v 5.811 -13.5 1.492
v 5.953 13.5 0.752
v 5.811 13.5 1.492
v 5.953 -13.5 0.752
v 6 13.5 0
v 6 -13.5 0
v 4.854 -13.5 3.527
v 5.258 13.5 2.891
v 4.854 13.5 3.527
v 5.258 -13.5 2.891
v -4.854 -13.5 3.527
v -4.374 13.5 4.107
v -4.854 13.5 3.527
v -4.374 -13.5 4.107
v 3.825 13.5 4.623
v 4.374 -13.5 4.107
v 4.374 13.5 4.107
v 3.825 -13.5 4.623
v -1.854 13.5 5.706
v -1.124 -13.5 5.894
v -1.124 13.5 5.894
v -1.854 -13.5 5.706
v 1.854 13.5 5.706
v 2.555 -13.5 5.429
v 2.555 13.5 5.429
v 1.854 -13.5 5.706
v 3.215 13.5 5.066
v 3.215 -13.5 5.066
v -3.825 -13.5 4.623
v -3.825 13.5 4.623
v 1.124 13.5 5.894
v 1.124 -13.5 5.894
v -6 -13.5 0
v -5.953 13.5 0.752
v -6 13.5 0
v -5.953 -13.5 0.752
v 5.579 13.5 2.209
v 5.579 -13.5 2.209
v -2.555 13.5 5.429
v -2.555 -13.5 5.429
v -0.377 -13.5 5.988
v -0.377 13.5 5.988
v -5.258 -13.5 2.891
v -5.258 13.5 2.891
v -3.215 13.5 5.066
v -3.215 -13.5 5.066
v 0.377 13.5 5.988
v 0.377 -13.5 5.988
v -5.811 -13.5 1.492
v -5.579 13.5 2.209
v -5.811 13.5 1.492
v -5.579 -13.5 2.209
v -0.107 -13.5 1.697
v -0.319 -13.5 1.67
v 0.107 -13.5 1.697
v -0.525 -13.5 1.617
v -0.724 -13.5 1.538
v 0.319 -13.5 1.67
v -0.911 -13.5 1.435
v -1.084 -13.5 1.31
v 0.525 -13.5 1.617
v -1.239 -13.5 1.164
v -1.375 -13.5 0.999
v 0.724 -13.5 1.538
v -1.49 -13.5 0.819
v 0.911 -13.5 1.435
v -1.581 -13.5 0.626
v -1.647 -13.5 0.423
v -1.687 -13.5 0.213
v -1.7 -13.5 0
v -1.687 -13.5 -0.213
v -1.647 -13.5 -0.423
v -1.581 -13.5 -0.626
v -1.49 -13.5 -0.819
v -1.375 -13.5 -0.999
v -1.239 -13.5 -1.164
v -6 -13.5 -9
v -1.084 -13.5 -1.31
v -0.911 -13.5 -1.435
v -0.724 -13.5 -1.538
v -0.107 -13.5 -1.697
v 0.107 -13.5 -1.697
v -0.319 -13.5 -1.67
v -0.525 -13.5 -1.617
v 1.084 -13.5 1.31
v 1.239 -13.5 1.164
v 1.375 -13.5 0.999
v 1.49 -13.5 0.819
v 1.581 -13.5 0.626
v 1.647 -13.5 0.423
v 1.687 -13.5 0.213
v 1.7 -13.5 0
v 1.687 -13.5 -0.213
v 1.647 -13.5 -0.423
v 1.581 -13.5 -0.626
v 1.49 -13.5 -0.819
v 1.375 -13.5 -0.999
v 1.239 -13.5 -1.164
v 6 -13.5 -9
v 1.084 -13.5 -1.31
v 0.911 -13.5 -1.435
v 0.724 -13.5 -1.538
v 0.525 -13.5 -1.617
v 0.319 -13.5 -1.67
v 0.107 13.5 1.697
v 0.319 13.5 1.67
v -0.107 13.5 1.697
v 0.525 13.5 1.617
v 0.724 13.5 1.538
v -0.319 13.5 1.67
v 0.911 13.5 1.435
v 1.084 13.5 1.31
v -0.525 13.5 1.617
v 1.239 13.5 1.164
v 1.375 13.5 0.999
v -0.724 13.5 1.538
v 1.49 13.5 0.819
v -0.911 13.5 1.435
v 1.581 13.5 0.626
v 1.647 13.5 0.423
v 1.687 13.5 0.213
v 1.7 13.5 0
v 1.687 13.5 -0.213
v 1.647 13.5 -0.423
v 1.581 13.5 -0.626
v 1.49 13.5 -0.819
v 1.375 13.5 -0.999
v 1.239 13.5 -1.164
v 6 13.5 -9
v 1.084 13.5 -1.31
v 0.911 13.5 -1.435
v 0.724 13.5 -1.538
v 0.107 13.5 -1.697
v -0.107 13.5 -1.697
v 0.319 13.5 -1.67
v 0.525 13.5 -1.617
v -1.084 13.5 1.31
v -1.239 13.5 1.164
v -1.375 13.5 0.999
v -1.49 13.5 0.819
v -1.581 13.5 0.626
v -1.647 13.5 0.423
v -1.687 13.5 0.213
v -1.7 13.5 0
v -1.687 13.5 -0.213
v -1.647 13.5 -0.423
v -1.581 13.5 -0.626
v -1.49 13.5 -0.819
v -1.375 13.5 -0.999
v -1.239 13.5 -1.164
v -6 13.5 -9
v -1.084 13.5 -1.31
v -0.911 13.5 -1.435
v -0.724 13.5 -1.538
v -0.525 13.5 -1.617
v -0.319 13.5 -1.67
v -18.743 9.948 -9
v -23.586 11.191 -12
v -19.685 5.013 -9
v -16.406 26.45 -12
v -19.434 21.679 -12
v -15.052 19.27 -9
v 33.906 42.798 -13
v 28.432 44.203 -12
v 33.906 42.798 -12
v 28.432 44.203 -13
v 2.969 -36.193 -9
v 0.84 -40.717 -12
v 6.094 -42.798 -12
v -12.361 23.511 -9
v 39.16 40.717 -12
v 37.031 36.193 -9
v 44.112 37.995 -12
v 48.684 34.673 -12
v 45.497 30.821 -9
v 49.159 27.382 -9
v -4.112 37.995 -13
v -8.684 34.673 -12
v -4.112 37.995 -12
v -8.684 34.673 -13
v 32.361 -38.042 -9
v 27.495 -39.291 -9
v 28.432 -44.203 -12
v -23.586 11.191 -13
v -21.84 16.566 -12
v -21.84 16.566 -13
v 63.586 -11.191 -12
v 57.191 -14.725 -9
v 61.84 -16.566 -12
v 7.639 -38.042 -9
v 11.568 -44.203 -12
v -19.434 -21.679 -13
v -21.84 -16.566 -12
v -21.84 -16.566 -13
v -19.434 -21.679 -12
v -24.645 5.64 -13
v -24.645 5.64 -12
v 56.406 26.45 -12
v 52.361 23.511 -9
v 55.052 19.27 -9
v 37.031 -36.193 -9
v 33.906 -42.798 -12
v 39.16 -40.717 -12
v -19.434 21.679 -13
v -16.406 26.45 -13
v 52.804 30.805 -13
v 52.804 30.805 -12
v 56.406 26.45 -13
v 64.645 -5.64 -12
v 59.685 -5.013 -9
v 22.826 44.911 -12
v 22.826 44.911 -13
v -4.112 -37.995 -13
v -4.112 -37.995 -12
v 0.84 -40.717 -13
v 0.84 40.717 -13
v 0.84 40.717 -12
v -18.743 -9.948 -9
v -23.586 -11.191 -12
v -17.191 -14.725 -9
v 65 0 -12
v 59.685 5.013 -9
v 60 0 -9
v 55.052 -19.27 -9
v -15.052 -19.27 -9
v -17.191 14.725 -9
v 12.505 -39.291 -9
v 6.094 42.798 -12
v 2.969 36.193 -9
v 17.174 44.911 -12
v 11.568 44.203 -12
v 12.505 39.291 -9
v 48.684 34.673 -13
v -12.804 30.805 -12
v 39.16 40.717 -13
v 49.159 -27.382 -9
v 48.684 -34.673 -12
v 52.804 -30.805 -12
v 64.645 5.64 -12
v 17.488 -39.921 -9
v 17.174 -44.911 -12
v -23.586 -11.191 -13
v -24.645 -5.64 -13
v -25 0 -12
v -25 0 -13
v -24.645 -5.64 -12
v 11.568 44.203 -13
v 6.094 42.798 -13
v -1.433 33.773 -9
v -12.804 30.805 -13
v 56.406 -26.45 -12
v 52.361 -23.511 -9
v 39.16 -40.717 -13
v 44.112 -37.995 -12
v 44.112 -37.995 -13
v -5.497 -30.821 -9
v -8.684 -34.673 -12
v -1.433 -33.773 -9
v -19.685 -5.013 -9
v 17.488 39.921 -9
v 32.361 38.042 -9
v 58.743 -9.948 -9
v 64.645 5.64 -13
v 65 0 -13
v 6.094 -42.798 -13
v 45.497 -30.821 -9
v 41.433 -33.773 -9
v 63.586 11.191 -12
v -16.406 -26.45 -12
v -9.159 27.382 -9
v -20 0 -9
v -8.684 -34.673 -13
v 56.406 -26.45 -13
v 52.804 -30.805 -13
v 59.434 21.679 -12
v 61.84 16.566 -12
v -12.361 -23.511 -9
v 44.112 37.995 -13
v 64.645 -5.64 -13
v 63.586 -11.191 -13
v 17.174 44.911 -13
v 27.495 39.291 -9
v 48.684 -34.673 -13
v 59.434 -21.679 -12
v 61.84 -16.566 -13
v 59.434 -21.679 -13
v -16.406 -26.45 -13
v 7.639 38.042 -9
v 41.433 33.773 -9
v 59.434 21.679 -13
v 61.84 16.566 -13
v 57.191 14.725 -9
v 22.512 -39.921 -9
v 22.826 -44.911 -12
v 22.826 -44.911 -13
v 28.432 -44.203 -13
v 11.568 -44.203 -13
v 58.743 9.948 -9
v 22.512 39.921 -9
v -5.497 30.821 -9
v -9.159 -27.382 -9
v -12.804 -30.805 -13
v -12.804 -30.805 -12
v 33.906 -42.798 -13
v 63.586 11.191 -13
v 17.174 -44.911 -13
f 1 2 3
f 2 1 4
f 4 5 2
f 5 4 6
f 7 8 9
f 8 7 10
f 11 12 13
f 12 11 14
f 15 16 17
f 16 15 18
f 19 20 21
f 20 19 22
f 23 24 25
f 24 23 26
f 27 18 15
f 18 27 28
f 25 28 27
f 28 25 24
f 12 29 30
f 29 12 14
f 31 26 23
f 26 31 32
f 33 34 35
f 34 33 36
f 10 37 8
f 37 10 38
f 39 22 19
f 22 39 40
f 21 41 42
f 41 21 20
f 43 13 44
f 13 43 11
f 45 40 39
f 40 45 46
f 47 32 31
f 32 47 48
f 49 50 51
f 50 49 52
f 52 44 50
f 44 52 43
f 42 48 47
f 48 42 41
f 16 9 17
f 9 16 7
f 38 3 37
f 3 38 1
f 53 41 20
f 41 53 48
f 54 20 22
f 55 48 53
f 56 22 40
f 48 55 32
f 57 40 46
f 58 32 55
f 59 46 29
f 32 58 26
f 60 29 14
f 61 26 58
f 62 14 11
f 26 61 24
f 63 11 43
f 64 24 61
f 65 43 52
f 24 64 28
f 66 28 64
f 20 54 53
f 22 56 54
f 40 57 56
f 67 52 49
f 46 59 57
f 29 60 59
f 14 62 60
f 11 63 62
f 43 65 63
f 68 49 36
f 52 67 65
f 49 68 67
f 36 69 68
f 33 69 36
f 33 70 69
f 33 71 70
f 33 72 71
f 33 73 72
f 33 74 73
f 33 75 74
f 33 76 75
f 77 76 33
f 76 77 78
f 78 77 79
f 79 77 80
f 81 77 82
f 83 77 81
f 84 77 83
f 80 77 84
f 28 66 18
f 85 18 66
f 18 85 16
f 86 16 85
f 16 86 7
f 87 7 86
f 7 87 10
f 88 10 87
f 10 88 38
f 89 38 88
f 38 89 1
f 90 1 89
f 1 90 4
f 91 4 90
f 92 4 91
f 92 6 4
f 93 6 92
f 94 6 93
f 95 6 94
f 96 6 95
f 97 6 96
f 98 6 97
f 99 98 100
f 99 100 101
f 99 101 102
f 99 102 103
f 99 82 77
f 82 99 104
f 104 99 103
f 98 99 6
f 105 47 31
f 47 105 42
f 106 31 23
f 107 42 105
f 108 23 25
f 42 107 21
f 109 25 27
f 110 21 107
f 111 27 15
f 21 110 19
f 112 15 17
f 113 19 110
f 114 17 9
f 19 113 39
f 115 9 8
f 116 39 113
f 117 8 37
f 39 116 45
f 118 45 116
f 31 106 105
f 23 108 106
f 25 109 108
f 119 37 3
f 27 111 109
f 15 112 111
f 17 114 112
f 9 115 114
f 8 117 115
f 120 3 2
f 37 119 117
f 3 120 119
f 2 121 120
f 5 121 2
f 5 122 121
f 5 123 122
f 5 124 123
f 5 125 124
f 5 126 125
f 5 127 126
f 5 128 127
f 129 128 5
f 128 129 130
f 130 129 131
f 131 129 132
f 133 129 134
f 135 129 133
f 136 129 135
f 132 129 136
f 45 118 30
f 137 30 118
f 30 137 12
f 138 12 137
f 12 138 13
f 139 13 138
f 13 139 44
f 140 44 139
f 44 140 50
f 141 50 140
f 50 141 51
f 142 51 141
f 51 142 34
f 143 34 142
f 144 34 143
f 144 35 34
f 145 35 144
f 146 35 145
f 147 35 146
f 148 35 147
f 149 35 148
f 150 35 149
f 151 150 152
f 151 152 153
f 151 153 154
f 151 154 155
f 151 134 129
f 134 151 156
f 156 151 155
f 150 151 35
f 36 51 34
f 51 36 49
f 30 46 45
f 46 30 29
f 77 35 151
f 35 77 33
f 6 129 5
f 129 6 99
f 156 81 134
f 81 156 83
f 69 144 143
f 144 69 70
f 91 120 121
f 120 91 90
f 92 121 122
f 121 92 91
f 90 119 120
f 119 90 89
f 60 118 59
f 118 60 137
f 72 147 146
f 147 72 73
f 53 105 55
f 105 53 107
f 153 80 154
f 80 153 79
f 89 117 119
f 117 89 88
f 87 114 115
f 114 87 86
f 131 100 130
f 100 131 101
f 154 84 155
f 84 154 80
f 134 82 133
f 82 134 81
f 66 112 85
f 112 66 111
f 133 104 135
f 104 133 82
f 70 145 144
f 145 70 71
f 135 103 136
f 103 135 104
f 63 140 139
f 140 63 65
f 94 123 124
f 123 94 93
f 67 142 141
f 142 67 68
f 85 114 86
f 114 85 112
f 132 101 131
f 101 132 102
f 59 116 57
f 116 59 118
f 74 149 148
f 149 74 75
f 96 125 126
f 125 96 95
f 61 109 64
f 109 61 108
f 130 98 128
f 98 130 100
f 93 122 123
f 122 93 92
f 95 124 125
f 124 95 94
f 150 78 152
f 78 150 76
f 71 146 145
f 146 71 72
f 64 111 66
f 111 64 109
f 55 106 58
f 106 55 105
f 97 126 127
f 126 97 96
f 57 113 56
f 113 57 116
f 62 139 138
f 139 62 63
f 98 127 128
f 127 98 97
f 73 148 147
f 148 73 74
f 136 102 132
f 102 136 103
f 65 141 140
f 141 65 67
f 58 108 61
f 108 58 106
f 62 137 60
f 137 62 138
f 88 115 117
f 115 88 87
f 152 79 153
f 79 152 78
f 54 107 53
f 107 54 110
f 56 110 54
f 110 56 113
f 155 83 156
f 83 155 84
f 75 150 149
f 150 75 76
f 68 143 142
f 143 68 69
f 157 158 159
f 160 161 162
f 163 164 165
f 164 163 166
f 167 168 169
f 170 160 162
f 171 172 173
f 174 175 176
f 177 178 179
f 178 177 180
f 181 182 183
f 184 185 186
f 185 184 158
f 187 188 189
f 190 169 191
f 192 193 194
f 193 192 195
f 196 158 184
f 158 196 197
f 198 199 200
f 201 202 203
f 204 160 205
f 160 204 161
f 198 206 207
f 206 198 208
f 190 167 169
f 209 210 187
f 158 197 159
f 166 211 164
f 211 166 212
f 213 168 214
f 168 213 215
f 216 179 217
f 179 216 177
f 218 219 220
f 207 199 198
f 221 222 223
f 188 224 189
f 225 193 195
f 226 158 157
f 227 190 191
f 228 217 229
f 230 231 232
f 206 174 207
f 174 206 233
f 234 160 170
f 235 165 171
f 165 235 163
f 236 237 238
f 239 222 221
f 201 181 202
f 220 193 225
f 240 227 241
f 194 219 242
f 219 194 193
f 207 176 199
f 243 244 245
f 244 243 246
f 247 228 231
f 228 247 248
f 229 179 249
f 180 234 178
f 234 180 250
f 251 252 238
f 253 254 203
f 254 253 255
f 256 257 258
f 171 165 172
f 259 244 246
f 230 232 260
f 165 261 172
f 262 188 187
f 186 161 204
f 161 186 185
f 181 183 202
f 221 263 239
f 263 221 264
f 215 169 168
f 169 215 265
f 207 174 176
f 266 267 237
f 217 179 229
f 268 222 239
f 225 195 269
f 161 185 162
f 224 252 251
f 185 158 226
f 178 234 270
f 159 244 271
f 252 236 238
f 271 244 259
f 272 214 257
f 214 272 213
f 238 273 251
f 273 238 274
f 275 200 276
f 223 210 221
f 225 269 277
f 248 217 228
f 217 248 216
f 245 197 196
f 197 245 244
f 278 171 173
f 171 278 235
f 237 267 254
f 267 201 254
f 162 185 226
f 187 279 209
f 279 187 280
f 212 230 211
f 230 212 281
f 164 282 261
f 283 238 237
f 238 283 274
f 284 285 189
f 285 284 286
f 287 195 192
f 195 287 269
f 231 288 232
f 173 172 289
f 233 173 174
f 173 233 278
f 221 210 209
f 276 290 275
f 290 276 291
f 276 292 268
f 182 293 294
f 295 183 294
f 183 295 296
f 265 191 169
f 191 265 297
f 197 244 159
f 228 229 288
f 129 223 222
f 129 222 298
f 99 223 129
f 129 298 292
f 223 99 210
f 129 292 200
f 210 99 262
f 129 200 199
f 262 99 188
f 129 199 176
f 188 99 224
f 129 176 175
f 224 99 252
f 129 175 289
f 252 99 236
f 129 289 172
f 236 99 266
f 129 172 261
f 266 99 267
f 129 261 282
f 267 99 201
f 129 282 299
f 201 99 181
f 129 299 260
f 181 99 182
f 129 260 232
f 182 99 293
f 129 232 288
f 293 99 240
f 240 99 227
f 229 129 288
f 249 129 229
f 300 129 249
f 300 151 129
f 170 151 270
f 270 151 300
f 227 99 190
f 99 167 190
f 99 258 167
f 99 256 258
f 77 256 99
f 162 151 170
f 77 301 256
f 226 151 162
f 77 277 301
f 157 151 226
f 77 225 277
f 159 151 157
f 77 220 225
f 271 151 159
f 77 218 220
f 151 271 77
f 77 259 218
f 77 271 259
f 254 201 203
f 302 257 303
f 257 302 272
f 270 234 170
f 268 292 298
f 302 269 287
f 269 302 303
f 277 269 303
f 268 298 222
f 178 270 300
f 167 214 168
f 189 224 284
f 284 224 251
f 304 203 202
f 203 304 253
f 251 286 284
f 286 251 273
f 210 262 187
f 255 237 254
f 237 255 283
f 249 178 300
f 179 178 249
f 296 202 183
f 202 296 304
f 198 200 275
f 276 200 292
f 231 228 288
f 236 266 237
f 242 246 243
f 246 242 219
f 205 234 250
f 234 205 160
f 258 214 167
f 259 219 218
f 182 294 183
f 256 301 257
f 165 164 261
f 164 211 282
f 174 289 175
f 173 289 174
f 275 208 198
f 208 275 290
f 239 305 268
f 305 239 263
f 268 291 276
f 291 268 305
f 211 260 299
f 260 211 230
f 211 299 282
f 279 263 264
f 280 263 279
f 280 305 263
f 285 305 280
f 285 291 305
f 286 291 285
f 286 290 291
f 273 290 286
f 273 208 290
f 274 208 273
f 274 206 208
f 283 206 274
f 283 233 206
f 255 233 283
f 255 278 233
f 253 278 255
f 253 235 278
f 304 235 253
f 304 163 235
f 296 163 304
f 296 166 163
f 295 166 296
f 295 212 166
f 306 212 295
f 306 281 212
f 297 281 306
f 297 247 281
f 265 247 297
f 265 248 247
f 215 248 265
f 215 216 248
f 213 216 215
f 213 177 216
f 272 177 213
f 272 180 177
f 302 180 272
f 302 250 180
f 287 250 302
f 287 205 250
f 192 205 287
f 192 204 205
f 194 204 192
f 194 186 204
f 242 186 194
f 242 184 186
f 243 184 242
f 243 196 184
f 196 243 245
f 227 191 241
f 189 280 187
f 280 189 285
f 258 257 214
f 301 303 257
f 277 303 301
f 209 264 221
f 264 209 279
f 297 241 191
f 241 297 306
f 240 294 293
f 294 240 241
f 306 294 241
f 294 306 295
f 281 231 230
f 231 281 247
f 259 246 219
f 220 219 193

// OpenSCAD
// file: pin_headers.scad
// pin_headers.scad
//
// Model of through-hole pin headers.
//
// Units are metric
//
// "height" is the total length of the pin. Default is 12mm.
// "upper" is the length of the pin above the stopper. Default is 7mm.
// "rows" is the number of rows. Default is 3.
// "cols" is the number of columns. Default is 2.
//
// Examples:
// pin_header( 12, 7, 2, 5);
// pin_header( rows=5 cols=1 );
// By Paul McGovern

module off_pin_header(height=12, upper=7, rows=3, cols=2) {
cl = 2.54;
translate( [ -(rows * cl/2 ), -(cols * cl/2 ), 0 ] )
pin_header(height, upper, rows,cols);
}

module pin_header( height=12, upper=7, rows=3, cols=2 ) {

        cl = 2.54;

        translate( [ -(rows * cl/2 ) + cl /2, -(cols * cl/2 ) + cl /2, 0 ] ) {

                for( col = [0: cols -1 ] ) {
                        for( row = [0 : rows -1 ] ) {

                                translate( [ cl * row , cl * col, 0] ) {
        
                                        color( "gray" )
                                                translate( [0,0, cl / 2]) {
                                                        intersection() {
                                                                cube( [ cl, cl, cl ], center=true );
                                                                rotate( [0, 0, 45] ) cube( [ 2.8, 2.8, cl ], center=true );
                                                }
                                }

                                color( "gold" ) {
                                        translate( [0,0, (upper - ( height/2 )) + cl ] ) {
                                                union() {
                                                        cube( [0.64,0.64,height], center=true );
                                                        translate( [0,0, height/2 ] ) scale( 0.64 ) _pin_point();
                                                        translate( [0,0, -height/2 ] ) scale( 0.64 )        rotate([180,0,0] )_pin_point();
                                                }
                                        }
                                }
                        }
                }
        }
}
}

module _pin_point() {
        translate( [-0.5,-0.5, 0])
                polyhedron(
                        points=[[0,0,0],[0,1,0],[1,1,0],[1,0,0],[0.5,0.5,0.5]],
                        triangles=[[0,1,2],[0,2,3],[0,1,4],[1,2,4],[2,3,4],[3,0,4]]);
}

off_pin_header();
%pin_header();
// file: tools.scad
module roundedRect(size, radius) {
	x = size[0];
	y = size[1];
	z = size[2];

	linear_extrude(height=z)
		hull() {
		translate([radius, radius, 0])
		circle(r=radius, $fn=10);

		translate([x - radius, radius, 0])
		circle(r=radius, $fn=10);

		translate([x - radius, y - radius, 0])
		circle(r=radius, $fn=10);

		translate([radius, y - radius, 0])
		circle(r=radius, $fn=10);
	}
}
// file: hardware.scad
// License: LGPL 2.1

rodsize = 6;        //threaded/smooth rod diameter in mm
xaxis = 182.5;        //width of base in mm
yaxis = 266.5;        //length of base in mm


screwsize = 3;        //bearing bore/screw diameter in mm
bearingsize = 10;        //outer diameter of bearings in mm
bearingwidth = 4;        //width of bearings in mm


rodpitch = rodsize / 6;
rodnutsize = 0.8 * rodsize;
rodnutdiameter = 1.9 * rodsize;
rodwashersize = 0.2 * rodsize;
rodwasherdiameter = 2 * rodsize;
screwpitch = screwsize / 6;
nutsize = 0.8 * screwsize;
nutdiameter = 1.9 * screwsize;
washersize = 0.2 * screwsize;
washerdiameter = 2 * screwsize;
partthick = 2 * rodsize;
vertexrodspace = 2 * rodsize;


c = [0.3, 0.3, 0.3];
rodendoffset = rodnutsize + rodwashersize * 2 + partthick / 2;
vertexoffset = vertexrodspace + rodendoffset;


renderrodthreads = false;
renderscrewthreads = false;
fn = 36;



module rod(length, threaded) if (threaded && renderrodthreads) {
        linear_extrude(height = length, center = true, convexity = 10, twist = -360 * length / rodpitch, $fn = fn)
                translate([rodsize * 0.1 / 2, 0, 0])
                        circle(r = rodsize * 0.9 / 2, $fn = fn);
} else cylinder(h = length, r = rodsize / 2, center = true, $fn = fn);


module screw(length, nutpos, washer, bearingpos = -1) union(){
        translate([0, 0, -length / 2]) if (renderscrewthreads) {
                linear_extrude(height = length, center = true, convexity = 10, twist = -360 * length / screwpitch, $fn = fn)
                        translate([screwsize * 0.1 / 2, 0, 0])
                                circle(r = screwsize * 0.9 / 2, $fn = fn);
        } else cylinder(h = length, r = screwsize / 2, center = true, $fn = fn);
        render() difference() {
                translate([0, 0, screwsize / 2]) cylinder(h = screwsize, r = screwsize, center = true, $fn = fn);
                translate([0, 0, screwsize]) cylinder(h = screwsize, r = screwsize / 2, center = true, $fn = 6);
        }
        if (washer > 0 && nutpos > 0) {
                washer(nutpos);
                nut(nutpos + washersize);
        } else if (nutpos > 0) nut(nutpos);
        if (bearingpos >= 0) bearing(bearingpos);
}


module bearing(position) render() translate([0, 0, -position - bearingwidth / 2]) union() {
        difference() {
                cylinder(h = bearingwidth, r = bearingsize / 2, center = true, $fn = fn);
                cylinder(h = bearingwidth * 2, r = bearingsize / 2 - 1, center = true, $fn = fn);
        }
        difference() {
                cylinder(h = bearingwidth - 0.5, r = bearingsize / 2 - 0.5, center = true, $fn = fn);
                cylinder(h = bearingwidth * 2, r = screwsize / 2 + 0.5, center = true, $fn = fn);
        }
        difference() {
                cylinder(h = bearingwidth, r = screwsize / 2 + 1, center = true, $fn = fn);
                cylinder(h = bearingwidth + 0.1, r = screwsize / 2, center = true, $fn = fn);
        }
}


module nut(position, washer) render() translate([0, 0, -position - nutsize / 2]) {
        intersection() {
                scale([1, 1, 0.5]) sphere(r = 1.05 * screwsize, center = true);
                difference() {
                        cylinder (h = nutsize, r = nutdiameter / 2, center = true, $fn = 6);
                        cylinder(r = screwsize / 2, h = nutsize + 0.1, center = true, $fn = fn);
                }
        }
        if (washer > 0) washer(0);
}


module washer(position) render() translate ([0, 0, -position - washersize / 2]) difference() {
        cylinder(r = washerdiameter / 2, h = washersize, center = true, $fn = fn);
        cylinder(r = screwsize / 2, h = washersize + 0.1, center = true, $fn = fn);
}

module rodnut(position, washer) render() translate([0, 0, position]) {
        intersection() {
                scale([1, 1, 0.5]) sphere(r = 1.05 * rodsize, center = true);
                difference() {
                        cylinder (h = rodnutsize, r = rodnutdiameter / 2, center = true, $fn = 6);
                        rod(rodnutsize + 0.1);
                }
        }
        if (washer == 1 || washer == 4) rodwasher(((position > 0) ? -1 : 1) * (rodnutsize + rodwashersize) / 2);
        if (washer == 2 || washer == 4) rodwasher(((position > 0) ? 1 : -1) * (rodnutsize + rodwashersize) / 2);
}


module rodwasher(position) render() translate ([0, 0, position]) difference() {
        cylinder(r = rodwasherdiameter / 2, h = rodwashersize, center = true, $fn = fn);
        rod(rodwashersize + 0.1);
}


rod(20);
translate([rodsize * 2.5, 0, 0]) rod(20, true);
translate([rodsize * 5, 0, 0]) screw(10, true);
translate([rodsize * 7.5, 0, 0]) bearing();
translate([rodsize * 10, 0, 0]) rodnut();
translate([rodsize * 12.5, 0, 0]) rodwasher();
translate([rodsize * 15, 0, 0]) nut();
translate([rodsize * 17.5, 0, 0]) washer();
// file: camera+support.scad
boxThickness =2;

module drawCamera(){
	translate([0,-1,-1])cube([27, 26,2]);
	color("black") translate([8.5,5.5,1]) cube([8,8,6]);
	translate([21+3+0.5,-2, -1-6]) rotate([0, 0, 90]) color("brown") cube([9, 22, 6]);
}

module drawOneCameraSupport(){
	translate([0,-3*boxThickness,-2*boxThickness]) cube([8, 6*boxThickness, 4*boxThickness]);
	}

module drawTopCameraSupport(){
	difference(){
		color("red") union(){
			translate([25-2*boxThickness, 0,0]) drawOneCameraSupport();
			translate([25-2*boxThickness, 24,0]) drawOneCameraSupport();
		}
		drawCamera();
	}
}

module drawBottomCameraSupport(){
	difference(){
		color("red") union(){
			translate([-boxThickness,0,0]) drawOneCameraSupport();
			translate([-boxThickness,24,0]) drawOneCameraSupport();
		}
		drawCamera();
	}
}

module drawCameraSupport(){
	difference(){
		color("red") union(){
			//translate([-boxThickness,0,0]) drawOneCameraSupport();
			translate([25-2*boxThickness, 0,0]) drawOneCameraSupport();
			//translate([-boxThickness,24,0]) drawOneCameraSupport();
			translate([25-2*boxThickness, 24,0]) drawOneCameraSupport();
		}
		drawCamera();
	}
}

drawTopCameraSupport();
drawBottomCameraSupport();
drawCamera();
// file: raspberry_pi.scad
//everything in mm

use <pin_headers.scad>;

width = 56.5;
length = 86;
height = 1.5;

color([0,1,0]) import("pi.STL");


module ethernet ()
{
//ethernet port
color("silver")
translate([length-20,1.5,height]) cube([21.2,16,13.3]);
}

module usb ()
{
//usb port
color("silver")
translate([length-9.5,25-1,height]) cube([17.3+30,15,16]);
}

module composite ()
{
//composite port
translate([length-43.6-1,width-12,height+1]){
        color("yellow")
        cube([10,10,13]);
        translate([5,24,8])
        rotate([90,0,0])
        color("silver")
        cylinder(h = 15, r = 5);
}
}

module audio ()
{
//audio jack
translate([length-26,width-11.5,height]){
        color("yellow")
        cube([12,11.5,13]);
        translate([6,11.5,8])
        rotate([-90,0,0])
        color("silver")
        cylinder(h = 10.5, r = 4.15);
}
}


module gpio ()
{
//headers
//rotate([0,0,180])
//translate([-1,-width+6,height])
//off_pin_header(rows = 13, cols = 2);
translate([0,56-17-5, 0]) cube([40, 10, 30]);
}

module hdmi ()
{
  color ("yellow") translate ([37.1,-1,height]) cube([15.1,11.7,8-height]);
}

module power ()
{
  translate ([-10.8,0.8,height-3]) cube ([15.6, 12,8.4-height]);
}

module sd ()
{
  color ([0,0,0]) translate ([0.9, 15.2,-5.2+height ]) cube ([16.8, 28.5, 5.2-height]);
  color ([.2,.2,.7]) translate ([-17.3,17.7,-2.9-0.5]) cube ([32, 24+1, 3] );
}

module mhole ()
{
  cylinder (r=3/2, h=height+.2, $fs=0.1);
}


module raspberrypi(){
//translate([-length/2,width/2 + 10,0])
{
difference () {
   color([0.2,0.5,0])
   linear_extrude(height = height)
   translate([0,-0.5,0])square([length,width]); //pcb
   translate ([25.5, 18,-0.1]) mhole ();
   translate ([length-5, width-12.5, -0.1]) mhole ();
}

ethernet ();
usb ();
composite ();
audio ();
gpio ();
hdmi ();
power ();
sd ();
}
}

raspberrypi();
// file: camette_box.scad
use <raspberry_pi.scad>
use <camera+support.scad>
use <hardware.scad>
use <tools.scad>
use <openhardwarefinal.scad>

raspSize = [105, 80,14.5];

boxThickness = 1;
boxRadius = 2;

module drawRaspBox(boxSize, rbox, rbias){
	cylinderCenterX = (boxSize[0]-rbox*8-boxRadius)/2;
union(){
difference(){
	union(){
		// design the round 1
		translate([rbox+cylinderCenterX, -rbox/2-rbias, 0])
		difference(){
			cylinder(h=boxSize[2], r=rbox+rbias, $fn=50);
			translate([-2*rbox,-3*rbox,-1])cube([rbox*4, 5*rbox/2+rbox+rbias, boxSize[2]+2]);
		}
		// design the round 2
		translate([((rbox)*3+cylinderCenterX), -rbox/2-rbias, 0])
		difference(){
			cylinder(h=boxSize[2], r=rbox+rbias, $fn=50);
			translate([-2*rbox,-3*rbox,-1])cube([rbox*4, 5*rbox/2+rbox+rbias, boxSize[2]+2]);
		}
		// design the round 3
		translate([(rbox)*5+cylinderCenterX, -rbox/2-rbias, 0])
		difference(){
			cylinder(h=boxSize[2], r=rbox+rbias, $fn=50);
			translate([-2*rbox,-3*rbox,-1])cube([rbox*4, 5*rbox/2+rbox+rbias, boxSize[2]+2]);
		}
		// design the round 4
		translate([(rbox)*7+cylinderCenterX, -rbox/2-rbias, 0])
		difference(){
			cylinder(h=boxSize[2], r=rbox+rbias, $fn=50);
			translate([-2*rbox,-3*rbox,-1])cube([rbox*4, 5*rbox/2+rbox+rbias, boxSize[2]+2]);
		}

		//design the box
		difference(){
		roundedRect(boxSize, boxRadius);
			translate([boxThickness,boxThickness,-boxThickness]) 
			roundedRect([boxSize[0]-boxThickness*2,boxSize[1]-boxThickness*2,boxSize[2]-boxThickness+1], boxRadius);
		}


	}

	translate([rbox+cylinderCenterX,-rbox/2-rbias, -boxThickness]) cylinder(h=boxSize[2]+2, r=(rbox-boxThickness+rbias), $fn=50);
	translate([3*(rbox)+cylinderCenterX,-rbox/2-rbias, -boxThickness]) cylinder(h=boxSize[2]+2, r=(rbox-boxThickness+rbias), $fn=50);
	translate([5*(rbox)+cylinderCenterX,-rbox/2-rbias, -boxThickness]) cylinder(h=boxSize[2]+2, r=(rbox-boxThickness+rbias), $fn=50);
	translate([7*(rbox)+cylinderCenterX,-rbox/2-rbias, -boxThickness]) cylinder(h=boxSize[2]+2, r=(rbox-boxThickness+rbias), $fn=50);

}

}

}

module drawBottomBox(){
	rfinger = (raspSize[0]/4-boxThickness)/2;
	tmpBoxSize = [raspSize[0]+rfinger/2+boxThickness, raspSize[1]+boxThickness, raspSize[2]+boxThickness]; 

	drawRaspBox(tmpBoxSize, rfinger, 0);
	rinsidefinger = ((raspSize[0])/4-boxThickness)/2;
	translate([boxThickness, boxThickness, -2*boxThickness]) drawRaspBox([tmpBoxSize[0]-2*boxThickness,tmpBoxSize[1]-2*boxThickness, tmpBoxSize[2]+2*boxThickness], rinsidefinger, boxThickness/2);
}

module drawTopBox(){
// Top box
	rfinger = (raspSize[0]/4-boxThickness)/2;
	tmpBoxSize = [raspSize[0]+rfinger/2+boxThickness, raspSize[1]+boxThickness, raspSize[2]+boxThickness];
	// design fisheye support
	translate([-1.5,0,0]) difference(){
		color("black")translate([raspSize[0]+6*boxThickness+2.5, raspSize[1]-14.5-1.5-8*boxThickness/2-1, raspSize[2]-12.5-1.5-1])rotate([0,90,0]) cylinder(h=4, r=7.5+3*boxThickness, $fn=50);
		translate([raspSize[0]+6*boxThickness+2.5-0.1, raspSize[1]-14.5-1.5-8*boxThickness/2-1, raspSize[2]-12.5-1.5-1])rotate([0,90,0]) cylinder(h=4.5, r=7.5, $fn=50);
	}
	difference(){
		color("red")rotate([0,180,0]) mirror() drawRaspBox(tmpBoxSize, rfinger, 0);		
	}
}

// Draw box with different cam/rapsberry support
module drawEntireTopBox(){
	rSmooth=15;
	smoothThickness = 3;
	angle=15;

	difference(){
	union(){
		drawTopBox();		
			// camette support
			translate([7*raspSize[0]/8+2*boxThickness, rSmooth+3*rfinger/4, -raspSize[2]-1])
			cylinder(h=2*boxThickness+2, r=rSmooth+3);
			translate([35+22, 26+28.5, -raspSize[2]-1]) cylinder(r=25, h=3);
			//camera
			translate([raspSize[0]-2*boxThickness, raspSize[1]-24-6*boxThickness, raspSize[2]-boxThickness]) rotate([-90,90,-90]){
				//drawCamera();
				drawTopCameraSupport();
			}
	}
		union(){
			// Raspberry
			translate([3*boxThickness, 56+rfinger/2+boxThickness+0.5,raspSize[2]-boxThickness-3]) rotate([180,0,0]) raspberrypi();
			// Logo
			translate([35, 26, -raspSize[2]-3.5]) scale([0.19, 0.19]) dxf_linear_extrude(file="logo_camera.dxf", height=3, convexity=1);
			// camera eye
			translate([raspSize[0]+4*boxThickness, raspSize[1]-14.5-1.5-8*boxThickness/2-1, raspSize[2]-12.5-1.5-1]) rotate([0,90,0]) cylinder(h=4*boxThickness, r=4, $fn=50);
			// camette support smooth gear
			//color("orange")translate([3*raspSize[0]/4+2*boxThickness, rSmooth+rfinger/2, -raspSize[2]-boxThickness-2]) smoothGear(angle, rSmooth, 3+1);
			color("orange") translate([7*raspSize[0]/8+2*boxThickness, rSmooth+3*rfinger/4, -raspSize[2]-2]) scale([0.18,0.18,1.0]) openHardware_intrude(4);

		}
	}
}

module drawEntireBottomBox(){
	rSmooth=15;
	smoothThickness = 3;
	angle=15;

	difference(){
		union(){
			color("blue") drawBottomBox(); 
			translate([80+3*boxThickness, 50+rfinger/2+boxThickness,raspSize[2]-9]) cube([10,10,10]);
			// camette support
// camette support
			translate([7*raspSize[0]/8+2*boxThickness, rSmooth+3*rfinger/4, raspSize[2]-boxThickness-2])
			cylinder(h=2*boxThickness+2, r=rSmooth+3);
			
			// sensor support
			translate([raspSize[0]-2*boxThickness, raspSize[1]-24-6*boxThickness, raspSize[2]-boxThickness]) rotate([-90,90,-90]){
				//drawCamera();
				drawBottomCameraSupport();
			}
		}

		union(){
			// Raspberry
			translate([3*boxThickness, 56+rfinger/2+boxThickness+0.5,raspSize[2]-boxThickness-3]) rotate([180,0,0]) raspberrypi();
translate([35,15, -raspSize[2]-3.5]) scale([0.2, 0.2]) dxf_linear_extrude(file="logo_camera.dxf", height=3, convexity=1);
			// camera eye
			translate([raspSize[0]+4*boxThickness, raspSize[1]-14.5-1.5-8*boxThickness/2-1, raspSize[2]-12.5-1.5-1]) rotate([0,90,0]) cylinder(h=4*boxThickness, r=4, $fn=50);
			// camette support smooth gear
			color("orange") translate([7*raspSize[0]/8+2*boxThickness, rSmooth+3*rfinger/4, raspSize[2]-2]) scale([0.18,0.18,1.0]) openHardware_intrude(4);
			
		}
	}
}

rfinger = (raspSize[0]/4-boxThickness)/2;


color("red") drawEntireTopBox();
color("blue") drawEntireBottomBox();
rfinger = (raspSize[0]/4-boxThickness)/2;
translate([3*boxThickness, 56+rfinger/2+boxThickness+0.5,raspSize[2]-boxThickness-3]) rotate([180,0,0]) raspberrypi();
// file: MOLETTE.scad
r_molette=8; //10 pour les petites et 12 pour les grandes
r_trou=1.5;
trou_m3=2;
ecrou_m3=3.2;
ep=5;
nb_trou=12;

module trou(){
	translate([r_molette,0,-5]){cylinder(h=ep+10, r=r_trou, $fn=50);}

}

module molette(){
	difference(){
		cylinder(h=ep, r=r_molette, $fn=100);

		translate([0,0,-5]){cylinder(h=ep+10, r=trou_m3, $fn=50);}
		translate([0,0,ep/2]){cylinder(h=ep, r=ecrou_m3, $fn=6);}

		for(i=[0:1:nb_trou]){
		rotate([0,0,i*(360/nb_trou)])trou();
		}

	}

}

molette();
// file: openhardwarefinal.scad
//-----------------------------------------------------------------------------
// Nelson Neves: nelson.s.neves@gmail.com
//-----------------------------------------------------------------------------
// disable $fn and $fa, do not change these
$fn=0;
$fa = 0.01;
// use $fs to control the number of facets globally // fine ~ 0.1 coarse ~ 1.0
$fs = 0.3;
//-----------------------------------------------------------------------------

module openHardware_extrude(oHeight){
	scale(v = [1.0, 1.0, 1.0]) {
		translate([-78.9,-71.2+5])
     		linear_extrude(height = oHeight) import("openhardwarefinal0_petit.dxf");

	}
}
//-----------------------------------------------------------------------------
module openHardware_intrude(oHeight){
	scale(v = [1.0, 1.0, 1.0]) {
		translate([-80, -76.6+11]) 
    		  linear_extrude(height = oHeight) import("openhardwarefinal0_grossi.dxf");
	}
}

difference(){
	cylinder(r=15, h=3);	
	translate([0,0,1])scale([0.15,0.15,1.0]) openHardware_intrude(3);
}

translate([30,0,0])
	scale([0.15,0.15,1.0])openHardware_extrude(3);
// main file
use <openhardwarefinal.scad>
use <MOLETTE.scad>
use <camette_box.scad>

raspSize = [105, 80,14.5+2];
supportHeight = 3;

module pied_support(angle){
	difference(){
		union(){
			hull(){
				cylinder(r=16, h=supportHeight, $fn=50);
				translate([0, 90, 0])
					cylinder(r=6, h=supportHeight, $fn=50);
			}
			translate([0, 90, supportHeight]) cylinder(r=6, h=supportHeight, $fn=50);
		}
		union(){
			translate([0,90*0.6/2,-1])scale([0.6,0.6,1.0])hull(){
				cylinder(r=16, h=supportHeight+2, $fn=50);
				translate([0, 90, 0])
					cylinder(r=6, h=supportHeight+2, $fn=50);
			}
			translate([0, 90, -1]) cylinder(r=1.7, h=2*supportHeight+2, $fn=50);
			rotate([0,0,angle]) translate([0,0,-1])scale([0.18,0.18,1.0]) openHardware_intrude(3);
		}			
	}

	rotate([0,0,angle]) translate([0,0,3]) scale([0.18,0.18,1.0]) openHardware_extrude(2);
}

module pied_support_droit(){
	pied_support(180-90+62.6);
}

module pied_support_gauche(){
	pied_support(-90-62.6);
}

module socle(){
	translate([0,raspSize[2]-3,0])rotate([90,0,0]) 
		difference(){
			union(){
				cylinder(r=6, h=raspSize[2]*2-6, $fn=50);
				translate([-6, 0, 0]) rotate([0, 0, -90])
					cube([10, 6*2,raspSize[2]*2-6]);
			}
			translate([0,0,-1]) cylinder(r=1.7, h=raspSize[2]*2-4, $fn=50);
		}
		translate([20,0,0]) hull(){
			translate([0, 0, -10])
				cylinder(r=40, h=1, $fn=50);
			translate([0, 0, -13])
				cylinder(r=45, h=1, $fn=50);
		}

		translate([40,-34,-9])rotate([0,0,90])scale([0.25,0.25,0.25]) linear_extrude(height = 1) import("camette.dxf");
}

//translate([0,-raspSize[2]-3,0])rotate([-90,0,0]) translate([0,-90,0]) 
//	pied_support_droit();
//translate([0,(raspSize[2]-supportHeight)+6, 0])rotate([-90,0,180]) translate([0,-90,0]) 
//	pied_support_gauche();
socle();
